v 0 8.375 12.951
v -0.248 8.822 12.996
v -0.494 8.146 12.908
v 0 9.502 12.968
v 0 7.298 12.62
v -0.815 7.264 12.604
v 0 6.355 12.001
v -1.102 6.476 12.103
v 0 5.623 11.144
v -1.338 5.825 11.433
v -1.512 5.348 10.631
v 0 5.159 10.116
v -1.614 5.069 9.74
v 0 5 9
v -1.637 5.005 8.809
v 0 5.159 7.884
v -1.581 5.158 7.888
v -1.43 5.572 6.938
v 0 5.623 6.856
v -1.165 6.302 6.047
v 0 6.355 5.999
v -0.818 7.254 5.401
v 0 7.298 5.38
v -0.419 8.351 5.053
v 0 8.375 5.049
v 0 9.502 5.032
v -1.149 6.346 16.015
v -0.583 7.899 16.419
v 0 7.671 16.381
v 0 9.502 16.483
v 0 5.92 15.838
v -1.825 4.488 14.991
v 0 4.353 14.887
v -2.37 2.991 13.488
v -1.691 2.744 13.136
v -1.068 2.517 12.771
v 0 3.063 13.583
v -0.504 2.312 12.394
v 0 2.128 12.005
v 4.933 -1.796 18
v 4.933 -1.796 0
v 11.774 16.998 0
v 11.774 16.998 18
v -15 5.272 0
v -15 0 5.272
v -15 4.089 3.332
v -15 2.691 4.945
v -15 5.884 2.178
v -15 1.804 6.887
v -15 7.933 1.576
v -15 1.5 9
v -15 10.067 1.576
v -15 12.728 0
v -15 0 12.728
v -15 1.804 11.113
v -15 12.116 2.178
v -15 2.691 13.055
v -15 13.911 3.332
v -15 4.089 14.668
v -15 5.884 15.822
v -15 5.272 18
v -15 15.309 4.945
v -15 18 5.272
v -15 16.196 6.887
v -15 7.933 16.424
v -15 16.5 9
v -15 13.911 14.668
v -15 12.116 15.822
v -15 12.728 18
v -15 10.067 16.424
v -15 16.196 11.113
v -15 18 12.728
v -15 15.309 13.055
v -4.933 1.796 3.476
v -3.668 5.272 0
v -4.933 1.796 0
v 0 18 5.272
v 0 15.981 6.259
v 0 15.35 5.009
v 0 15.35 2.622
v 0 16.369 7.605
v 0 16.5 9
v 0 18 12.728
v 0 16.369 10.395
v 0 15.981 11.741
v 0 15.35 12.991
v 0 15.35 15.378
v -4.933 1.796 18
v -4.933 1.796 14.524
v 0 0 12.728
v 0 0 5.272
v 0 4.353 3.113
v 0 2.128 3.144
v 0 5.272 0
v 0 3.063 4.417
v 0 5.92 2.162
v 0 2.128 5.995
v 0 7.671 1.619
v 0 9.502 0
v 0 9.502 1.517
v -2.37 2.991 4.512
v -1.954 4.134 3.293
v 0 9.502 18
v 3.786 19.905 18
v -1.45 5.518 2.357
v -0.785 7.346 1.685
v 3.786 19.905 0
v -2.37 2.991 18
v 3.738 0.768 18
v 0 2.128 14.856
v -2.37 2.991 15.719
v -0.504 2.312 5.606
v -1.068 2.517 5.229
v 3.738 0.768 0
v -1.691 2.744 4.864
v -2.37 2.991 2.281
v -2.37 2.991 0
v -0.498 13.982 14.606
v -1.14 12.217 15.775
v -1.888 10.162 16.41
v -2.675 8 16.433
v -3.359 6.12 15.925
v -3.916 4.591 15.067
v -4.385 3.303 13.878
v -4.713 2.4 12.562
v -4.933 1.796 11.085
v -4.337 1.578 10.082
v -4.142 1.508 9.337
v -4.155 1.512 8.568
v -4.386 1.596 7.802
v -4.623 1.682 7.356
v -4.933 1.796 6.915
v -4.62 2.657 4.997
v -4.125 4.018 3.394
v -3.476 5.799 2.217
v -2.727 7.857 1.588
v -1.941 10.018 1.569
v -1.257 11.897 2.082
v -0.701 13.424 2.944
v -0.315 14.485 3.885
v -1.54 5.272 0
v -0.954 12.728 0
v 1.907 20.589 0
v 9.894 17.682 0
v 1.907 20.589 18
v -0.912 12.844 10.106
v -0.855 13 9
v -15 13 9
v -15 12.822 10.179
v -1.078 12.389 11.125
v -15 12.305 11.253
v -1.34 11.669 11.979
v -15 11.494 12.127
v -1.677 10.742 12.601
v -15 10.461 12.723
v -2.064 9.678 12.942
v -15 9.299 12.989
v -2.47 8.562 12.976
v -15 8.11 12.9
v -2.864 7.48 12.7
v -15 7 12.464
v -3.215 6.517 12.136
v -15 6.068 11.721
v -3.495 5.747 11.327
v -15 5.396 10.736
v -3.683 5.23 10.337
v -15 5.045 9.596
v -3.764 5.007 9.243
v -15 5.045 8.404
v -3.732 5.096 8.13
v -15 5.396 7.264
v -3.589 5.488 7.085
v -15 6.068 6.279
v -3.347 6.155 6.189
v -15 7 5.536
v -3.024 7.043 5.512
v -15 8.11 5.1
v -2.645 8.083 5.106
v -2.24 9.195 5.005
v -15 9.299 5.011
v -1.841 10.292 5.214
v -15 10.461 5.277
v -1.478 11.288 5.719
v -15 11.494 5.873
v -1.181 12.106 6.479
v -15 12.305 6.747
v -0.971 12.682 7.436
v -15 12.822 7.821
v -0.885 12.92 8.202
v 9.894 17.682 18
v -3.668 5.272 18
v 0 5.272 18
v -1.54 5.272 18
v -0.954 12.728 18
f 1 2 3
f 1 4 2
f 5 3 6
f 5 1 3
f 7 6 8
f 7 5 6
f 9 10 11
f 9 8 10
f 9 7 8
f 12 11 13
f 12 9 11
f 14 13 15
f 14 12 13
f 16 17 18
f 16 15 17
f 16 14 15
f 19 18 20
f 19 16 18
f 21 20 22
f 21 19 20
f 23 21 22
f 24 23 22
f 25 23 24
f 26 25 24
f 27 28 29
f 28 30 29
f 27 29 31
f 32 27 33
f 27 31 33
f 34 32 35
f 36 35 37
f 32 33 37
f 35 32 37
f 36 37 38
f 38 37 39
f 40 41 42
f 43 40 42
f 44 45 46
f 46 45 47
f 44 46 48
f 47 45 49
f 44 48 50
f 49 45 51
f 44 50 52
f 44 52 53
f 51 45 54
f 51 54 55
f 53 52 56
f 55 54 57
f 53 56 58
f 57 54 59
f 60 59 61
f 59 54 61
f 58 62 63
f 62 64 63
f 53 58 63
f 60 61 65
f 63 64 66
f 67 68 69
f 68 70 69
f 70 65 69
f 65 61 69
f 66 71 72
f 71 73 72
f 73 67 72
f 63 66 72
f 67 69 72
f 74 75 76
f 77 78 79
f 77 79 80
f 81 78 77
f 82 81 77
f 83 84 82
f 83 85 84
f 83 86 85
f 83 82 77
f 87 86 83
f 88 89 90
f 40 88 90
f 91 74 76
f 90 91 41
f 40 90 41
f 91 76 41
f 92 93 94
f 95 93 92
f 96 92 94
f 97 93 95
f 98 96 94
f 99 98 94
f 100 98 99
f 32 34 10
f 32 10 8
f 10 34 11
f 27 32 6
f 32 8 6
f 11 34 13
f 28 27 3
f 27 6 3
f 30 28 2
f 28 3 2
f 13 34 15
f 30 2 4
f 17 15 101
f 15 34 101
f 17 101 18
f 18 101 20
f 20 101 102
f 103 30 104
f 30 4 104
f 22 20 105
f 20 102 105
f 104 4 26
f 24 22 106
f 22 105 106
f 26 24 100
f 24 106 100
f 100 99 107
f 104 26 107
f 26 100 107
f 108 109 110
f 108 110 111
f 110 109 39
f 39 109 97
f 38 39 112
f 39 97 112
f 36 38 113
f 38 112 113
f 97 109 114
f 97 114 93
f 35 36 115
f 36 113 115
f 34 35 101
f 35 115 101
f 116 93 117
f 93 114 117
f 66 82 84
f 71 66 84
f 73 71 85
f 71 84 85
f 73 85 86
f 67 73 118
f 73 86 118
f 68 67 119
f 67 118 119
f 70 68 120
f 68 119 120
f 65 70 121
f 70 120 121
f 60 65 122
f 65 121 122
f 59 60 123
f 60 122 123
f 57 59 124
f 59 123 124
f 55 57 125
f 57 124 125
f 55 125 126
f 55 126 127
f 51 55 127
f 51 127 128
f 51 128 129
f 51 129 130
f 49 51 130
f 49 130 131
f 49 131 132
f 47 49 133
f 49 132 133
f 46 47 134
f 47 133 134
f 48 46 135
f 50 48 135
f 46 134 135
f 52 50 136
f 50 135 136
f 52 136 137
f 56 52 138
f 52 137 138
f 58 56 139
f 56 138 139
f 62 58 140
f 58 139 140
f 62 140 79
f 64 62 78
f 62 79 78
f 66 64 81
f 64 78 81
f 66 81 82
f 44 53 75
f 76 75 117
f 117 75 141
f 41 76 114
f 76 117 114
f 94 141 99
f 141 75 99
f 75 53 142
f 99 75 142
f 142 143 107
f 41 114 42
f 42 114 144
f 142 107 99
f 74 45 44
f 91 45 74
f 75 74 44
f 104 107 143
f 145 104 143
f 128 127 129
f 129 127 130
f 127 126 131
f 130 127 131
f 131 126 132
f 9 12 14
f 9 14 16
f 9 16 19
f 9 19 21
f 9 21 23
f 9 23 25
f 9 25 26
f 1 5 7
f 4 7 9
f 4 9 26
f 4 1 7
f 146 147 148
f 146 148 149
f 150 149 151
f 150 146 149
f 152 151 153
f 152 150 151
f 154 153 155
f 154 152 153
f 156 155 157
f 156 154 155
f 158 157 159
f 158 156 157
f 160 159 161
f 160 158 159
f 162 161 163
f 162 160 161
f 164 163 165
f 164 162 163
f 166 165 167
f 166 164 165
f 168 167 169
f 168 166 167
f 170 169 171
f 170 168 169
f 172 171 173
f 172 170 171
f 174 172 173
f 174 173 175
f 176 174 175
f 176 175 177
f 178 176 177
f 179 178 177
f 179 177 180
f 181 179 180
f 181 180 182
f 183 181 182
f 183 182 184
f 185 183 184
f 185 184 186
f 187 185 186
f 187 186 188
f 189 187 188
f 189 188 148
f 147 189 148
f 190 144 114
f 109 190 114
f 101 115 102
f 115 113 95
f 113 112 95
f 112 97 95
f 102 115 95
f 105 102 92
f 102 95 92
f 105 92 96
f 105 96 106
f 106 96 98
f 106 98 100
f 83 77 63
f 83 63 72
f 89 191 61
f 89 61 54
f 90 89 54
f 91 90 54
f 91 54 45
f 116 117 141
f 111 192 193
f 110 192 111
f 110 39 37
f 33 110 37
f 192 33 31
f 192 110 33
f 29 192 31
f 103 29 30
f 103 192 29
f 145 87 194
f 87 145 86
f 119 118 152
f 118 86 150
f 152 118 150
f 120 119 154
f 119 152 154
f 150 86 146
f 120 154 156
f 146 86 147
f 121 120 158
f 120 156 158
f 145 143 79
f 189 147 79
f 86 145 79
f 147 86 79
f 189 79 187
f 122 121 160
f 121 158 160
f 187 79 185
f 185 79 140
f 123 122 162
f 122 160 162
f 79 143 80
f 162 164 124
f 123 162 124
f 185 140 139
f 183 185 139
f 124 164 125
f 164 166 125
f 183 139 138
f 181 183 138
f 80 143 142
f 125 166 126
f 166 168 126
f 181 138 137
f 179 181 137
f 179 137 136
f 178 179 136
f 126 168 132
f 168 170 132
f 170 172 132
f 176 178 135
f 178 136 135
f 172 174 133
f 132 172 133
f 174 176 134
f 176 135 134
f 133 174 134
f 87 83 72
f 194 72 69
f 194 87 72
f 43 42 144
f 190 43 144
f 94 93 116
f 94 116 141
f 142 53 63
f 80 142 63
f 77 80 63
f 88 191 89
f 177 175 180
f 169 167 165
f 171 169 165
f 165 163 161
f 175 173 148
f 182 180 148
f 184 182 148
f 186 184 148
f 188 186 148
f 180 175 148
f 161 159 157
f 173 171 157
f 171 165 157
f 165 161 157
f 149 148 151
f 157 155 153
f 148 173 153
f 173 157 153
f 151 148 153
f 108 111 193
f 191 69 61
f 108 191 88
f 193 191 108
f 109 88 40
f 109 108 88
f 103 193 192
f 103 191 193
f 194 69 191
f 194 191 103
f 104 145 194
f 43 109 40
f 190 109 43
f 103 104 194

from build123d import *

# Parameters (mm, degrees)
PAD_DEPTH     = 18
SKETCH001_R   = 7.5
SKETCH001_R_2 = 4
PAD001_DEPTH  = 15


with BuildPart() as part:
    # Sketch → Pad (new body)
    with BuildSketch(Plane(origin=(0, 0, 0), x_dir=(0.939693, -0.34202, 0), z_dir=(0, 0, 1))):
        Polygon((-5.25, 20), (-5.25, 0), (5.25, 0), (5.25, 20), (3.25, 20), (3.25, 2), (-3.25, 2), (-3.25, 20), align=None)
    extrude(amount=PAD_DEPTH)

    # Sketch001 → Pad001 (join)
    with BuildSketch(Plane.YZ):
        Polygon((12.727922, 18), (5.272078, 18), (0, 12.727922), (0, 5.272078), (5.272078, 0), (12.727922, 0), (18, 5.272078), (18, 12.727922), align=None)
        with Locations((9, 9)):
            Circle(SKETCH001_R, mode=Mode.SUBTRACT)
        with Locations((9, 9)):
            Circle(SKETCH001_R_2)
    extrude(amount=-PAD001_DEPTH)


solid = part.part
